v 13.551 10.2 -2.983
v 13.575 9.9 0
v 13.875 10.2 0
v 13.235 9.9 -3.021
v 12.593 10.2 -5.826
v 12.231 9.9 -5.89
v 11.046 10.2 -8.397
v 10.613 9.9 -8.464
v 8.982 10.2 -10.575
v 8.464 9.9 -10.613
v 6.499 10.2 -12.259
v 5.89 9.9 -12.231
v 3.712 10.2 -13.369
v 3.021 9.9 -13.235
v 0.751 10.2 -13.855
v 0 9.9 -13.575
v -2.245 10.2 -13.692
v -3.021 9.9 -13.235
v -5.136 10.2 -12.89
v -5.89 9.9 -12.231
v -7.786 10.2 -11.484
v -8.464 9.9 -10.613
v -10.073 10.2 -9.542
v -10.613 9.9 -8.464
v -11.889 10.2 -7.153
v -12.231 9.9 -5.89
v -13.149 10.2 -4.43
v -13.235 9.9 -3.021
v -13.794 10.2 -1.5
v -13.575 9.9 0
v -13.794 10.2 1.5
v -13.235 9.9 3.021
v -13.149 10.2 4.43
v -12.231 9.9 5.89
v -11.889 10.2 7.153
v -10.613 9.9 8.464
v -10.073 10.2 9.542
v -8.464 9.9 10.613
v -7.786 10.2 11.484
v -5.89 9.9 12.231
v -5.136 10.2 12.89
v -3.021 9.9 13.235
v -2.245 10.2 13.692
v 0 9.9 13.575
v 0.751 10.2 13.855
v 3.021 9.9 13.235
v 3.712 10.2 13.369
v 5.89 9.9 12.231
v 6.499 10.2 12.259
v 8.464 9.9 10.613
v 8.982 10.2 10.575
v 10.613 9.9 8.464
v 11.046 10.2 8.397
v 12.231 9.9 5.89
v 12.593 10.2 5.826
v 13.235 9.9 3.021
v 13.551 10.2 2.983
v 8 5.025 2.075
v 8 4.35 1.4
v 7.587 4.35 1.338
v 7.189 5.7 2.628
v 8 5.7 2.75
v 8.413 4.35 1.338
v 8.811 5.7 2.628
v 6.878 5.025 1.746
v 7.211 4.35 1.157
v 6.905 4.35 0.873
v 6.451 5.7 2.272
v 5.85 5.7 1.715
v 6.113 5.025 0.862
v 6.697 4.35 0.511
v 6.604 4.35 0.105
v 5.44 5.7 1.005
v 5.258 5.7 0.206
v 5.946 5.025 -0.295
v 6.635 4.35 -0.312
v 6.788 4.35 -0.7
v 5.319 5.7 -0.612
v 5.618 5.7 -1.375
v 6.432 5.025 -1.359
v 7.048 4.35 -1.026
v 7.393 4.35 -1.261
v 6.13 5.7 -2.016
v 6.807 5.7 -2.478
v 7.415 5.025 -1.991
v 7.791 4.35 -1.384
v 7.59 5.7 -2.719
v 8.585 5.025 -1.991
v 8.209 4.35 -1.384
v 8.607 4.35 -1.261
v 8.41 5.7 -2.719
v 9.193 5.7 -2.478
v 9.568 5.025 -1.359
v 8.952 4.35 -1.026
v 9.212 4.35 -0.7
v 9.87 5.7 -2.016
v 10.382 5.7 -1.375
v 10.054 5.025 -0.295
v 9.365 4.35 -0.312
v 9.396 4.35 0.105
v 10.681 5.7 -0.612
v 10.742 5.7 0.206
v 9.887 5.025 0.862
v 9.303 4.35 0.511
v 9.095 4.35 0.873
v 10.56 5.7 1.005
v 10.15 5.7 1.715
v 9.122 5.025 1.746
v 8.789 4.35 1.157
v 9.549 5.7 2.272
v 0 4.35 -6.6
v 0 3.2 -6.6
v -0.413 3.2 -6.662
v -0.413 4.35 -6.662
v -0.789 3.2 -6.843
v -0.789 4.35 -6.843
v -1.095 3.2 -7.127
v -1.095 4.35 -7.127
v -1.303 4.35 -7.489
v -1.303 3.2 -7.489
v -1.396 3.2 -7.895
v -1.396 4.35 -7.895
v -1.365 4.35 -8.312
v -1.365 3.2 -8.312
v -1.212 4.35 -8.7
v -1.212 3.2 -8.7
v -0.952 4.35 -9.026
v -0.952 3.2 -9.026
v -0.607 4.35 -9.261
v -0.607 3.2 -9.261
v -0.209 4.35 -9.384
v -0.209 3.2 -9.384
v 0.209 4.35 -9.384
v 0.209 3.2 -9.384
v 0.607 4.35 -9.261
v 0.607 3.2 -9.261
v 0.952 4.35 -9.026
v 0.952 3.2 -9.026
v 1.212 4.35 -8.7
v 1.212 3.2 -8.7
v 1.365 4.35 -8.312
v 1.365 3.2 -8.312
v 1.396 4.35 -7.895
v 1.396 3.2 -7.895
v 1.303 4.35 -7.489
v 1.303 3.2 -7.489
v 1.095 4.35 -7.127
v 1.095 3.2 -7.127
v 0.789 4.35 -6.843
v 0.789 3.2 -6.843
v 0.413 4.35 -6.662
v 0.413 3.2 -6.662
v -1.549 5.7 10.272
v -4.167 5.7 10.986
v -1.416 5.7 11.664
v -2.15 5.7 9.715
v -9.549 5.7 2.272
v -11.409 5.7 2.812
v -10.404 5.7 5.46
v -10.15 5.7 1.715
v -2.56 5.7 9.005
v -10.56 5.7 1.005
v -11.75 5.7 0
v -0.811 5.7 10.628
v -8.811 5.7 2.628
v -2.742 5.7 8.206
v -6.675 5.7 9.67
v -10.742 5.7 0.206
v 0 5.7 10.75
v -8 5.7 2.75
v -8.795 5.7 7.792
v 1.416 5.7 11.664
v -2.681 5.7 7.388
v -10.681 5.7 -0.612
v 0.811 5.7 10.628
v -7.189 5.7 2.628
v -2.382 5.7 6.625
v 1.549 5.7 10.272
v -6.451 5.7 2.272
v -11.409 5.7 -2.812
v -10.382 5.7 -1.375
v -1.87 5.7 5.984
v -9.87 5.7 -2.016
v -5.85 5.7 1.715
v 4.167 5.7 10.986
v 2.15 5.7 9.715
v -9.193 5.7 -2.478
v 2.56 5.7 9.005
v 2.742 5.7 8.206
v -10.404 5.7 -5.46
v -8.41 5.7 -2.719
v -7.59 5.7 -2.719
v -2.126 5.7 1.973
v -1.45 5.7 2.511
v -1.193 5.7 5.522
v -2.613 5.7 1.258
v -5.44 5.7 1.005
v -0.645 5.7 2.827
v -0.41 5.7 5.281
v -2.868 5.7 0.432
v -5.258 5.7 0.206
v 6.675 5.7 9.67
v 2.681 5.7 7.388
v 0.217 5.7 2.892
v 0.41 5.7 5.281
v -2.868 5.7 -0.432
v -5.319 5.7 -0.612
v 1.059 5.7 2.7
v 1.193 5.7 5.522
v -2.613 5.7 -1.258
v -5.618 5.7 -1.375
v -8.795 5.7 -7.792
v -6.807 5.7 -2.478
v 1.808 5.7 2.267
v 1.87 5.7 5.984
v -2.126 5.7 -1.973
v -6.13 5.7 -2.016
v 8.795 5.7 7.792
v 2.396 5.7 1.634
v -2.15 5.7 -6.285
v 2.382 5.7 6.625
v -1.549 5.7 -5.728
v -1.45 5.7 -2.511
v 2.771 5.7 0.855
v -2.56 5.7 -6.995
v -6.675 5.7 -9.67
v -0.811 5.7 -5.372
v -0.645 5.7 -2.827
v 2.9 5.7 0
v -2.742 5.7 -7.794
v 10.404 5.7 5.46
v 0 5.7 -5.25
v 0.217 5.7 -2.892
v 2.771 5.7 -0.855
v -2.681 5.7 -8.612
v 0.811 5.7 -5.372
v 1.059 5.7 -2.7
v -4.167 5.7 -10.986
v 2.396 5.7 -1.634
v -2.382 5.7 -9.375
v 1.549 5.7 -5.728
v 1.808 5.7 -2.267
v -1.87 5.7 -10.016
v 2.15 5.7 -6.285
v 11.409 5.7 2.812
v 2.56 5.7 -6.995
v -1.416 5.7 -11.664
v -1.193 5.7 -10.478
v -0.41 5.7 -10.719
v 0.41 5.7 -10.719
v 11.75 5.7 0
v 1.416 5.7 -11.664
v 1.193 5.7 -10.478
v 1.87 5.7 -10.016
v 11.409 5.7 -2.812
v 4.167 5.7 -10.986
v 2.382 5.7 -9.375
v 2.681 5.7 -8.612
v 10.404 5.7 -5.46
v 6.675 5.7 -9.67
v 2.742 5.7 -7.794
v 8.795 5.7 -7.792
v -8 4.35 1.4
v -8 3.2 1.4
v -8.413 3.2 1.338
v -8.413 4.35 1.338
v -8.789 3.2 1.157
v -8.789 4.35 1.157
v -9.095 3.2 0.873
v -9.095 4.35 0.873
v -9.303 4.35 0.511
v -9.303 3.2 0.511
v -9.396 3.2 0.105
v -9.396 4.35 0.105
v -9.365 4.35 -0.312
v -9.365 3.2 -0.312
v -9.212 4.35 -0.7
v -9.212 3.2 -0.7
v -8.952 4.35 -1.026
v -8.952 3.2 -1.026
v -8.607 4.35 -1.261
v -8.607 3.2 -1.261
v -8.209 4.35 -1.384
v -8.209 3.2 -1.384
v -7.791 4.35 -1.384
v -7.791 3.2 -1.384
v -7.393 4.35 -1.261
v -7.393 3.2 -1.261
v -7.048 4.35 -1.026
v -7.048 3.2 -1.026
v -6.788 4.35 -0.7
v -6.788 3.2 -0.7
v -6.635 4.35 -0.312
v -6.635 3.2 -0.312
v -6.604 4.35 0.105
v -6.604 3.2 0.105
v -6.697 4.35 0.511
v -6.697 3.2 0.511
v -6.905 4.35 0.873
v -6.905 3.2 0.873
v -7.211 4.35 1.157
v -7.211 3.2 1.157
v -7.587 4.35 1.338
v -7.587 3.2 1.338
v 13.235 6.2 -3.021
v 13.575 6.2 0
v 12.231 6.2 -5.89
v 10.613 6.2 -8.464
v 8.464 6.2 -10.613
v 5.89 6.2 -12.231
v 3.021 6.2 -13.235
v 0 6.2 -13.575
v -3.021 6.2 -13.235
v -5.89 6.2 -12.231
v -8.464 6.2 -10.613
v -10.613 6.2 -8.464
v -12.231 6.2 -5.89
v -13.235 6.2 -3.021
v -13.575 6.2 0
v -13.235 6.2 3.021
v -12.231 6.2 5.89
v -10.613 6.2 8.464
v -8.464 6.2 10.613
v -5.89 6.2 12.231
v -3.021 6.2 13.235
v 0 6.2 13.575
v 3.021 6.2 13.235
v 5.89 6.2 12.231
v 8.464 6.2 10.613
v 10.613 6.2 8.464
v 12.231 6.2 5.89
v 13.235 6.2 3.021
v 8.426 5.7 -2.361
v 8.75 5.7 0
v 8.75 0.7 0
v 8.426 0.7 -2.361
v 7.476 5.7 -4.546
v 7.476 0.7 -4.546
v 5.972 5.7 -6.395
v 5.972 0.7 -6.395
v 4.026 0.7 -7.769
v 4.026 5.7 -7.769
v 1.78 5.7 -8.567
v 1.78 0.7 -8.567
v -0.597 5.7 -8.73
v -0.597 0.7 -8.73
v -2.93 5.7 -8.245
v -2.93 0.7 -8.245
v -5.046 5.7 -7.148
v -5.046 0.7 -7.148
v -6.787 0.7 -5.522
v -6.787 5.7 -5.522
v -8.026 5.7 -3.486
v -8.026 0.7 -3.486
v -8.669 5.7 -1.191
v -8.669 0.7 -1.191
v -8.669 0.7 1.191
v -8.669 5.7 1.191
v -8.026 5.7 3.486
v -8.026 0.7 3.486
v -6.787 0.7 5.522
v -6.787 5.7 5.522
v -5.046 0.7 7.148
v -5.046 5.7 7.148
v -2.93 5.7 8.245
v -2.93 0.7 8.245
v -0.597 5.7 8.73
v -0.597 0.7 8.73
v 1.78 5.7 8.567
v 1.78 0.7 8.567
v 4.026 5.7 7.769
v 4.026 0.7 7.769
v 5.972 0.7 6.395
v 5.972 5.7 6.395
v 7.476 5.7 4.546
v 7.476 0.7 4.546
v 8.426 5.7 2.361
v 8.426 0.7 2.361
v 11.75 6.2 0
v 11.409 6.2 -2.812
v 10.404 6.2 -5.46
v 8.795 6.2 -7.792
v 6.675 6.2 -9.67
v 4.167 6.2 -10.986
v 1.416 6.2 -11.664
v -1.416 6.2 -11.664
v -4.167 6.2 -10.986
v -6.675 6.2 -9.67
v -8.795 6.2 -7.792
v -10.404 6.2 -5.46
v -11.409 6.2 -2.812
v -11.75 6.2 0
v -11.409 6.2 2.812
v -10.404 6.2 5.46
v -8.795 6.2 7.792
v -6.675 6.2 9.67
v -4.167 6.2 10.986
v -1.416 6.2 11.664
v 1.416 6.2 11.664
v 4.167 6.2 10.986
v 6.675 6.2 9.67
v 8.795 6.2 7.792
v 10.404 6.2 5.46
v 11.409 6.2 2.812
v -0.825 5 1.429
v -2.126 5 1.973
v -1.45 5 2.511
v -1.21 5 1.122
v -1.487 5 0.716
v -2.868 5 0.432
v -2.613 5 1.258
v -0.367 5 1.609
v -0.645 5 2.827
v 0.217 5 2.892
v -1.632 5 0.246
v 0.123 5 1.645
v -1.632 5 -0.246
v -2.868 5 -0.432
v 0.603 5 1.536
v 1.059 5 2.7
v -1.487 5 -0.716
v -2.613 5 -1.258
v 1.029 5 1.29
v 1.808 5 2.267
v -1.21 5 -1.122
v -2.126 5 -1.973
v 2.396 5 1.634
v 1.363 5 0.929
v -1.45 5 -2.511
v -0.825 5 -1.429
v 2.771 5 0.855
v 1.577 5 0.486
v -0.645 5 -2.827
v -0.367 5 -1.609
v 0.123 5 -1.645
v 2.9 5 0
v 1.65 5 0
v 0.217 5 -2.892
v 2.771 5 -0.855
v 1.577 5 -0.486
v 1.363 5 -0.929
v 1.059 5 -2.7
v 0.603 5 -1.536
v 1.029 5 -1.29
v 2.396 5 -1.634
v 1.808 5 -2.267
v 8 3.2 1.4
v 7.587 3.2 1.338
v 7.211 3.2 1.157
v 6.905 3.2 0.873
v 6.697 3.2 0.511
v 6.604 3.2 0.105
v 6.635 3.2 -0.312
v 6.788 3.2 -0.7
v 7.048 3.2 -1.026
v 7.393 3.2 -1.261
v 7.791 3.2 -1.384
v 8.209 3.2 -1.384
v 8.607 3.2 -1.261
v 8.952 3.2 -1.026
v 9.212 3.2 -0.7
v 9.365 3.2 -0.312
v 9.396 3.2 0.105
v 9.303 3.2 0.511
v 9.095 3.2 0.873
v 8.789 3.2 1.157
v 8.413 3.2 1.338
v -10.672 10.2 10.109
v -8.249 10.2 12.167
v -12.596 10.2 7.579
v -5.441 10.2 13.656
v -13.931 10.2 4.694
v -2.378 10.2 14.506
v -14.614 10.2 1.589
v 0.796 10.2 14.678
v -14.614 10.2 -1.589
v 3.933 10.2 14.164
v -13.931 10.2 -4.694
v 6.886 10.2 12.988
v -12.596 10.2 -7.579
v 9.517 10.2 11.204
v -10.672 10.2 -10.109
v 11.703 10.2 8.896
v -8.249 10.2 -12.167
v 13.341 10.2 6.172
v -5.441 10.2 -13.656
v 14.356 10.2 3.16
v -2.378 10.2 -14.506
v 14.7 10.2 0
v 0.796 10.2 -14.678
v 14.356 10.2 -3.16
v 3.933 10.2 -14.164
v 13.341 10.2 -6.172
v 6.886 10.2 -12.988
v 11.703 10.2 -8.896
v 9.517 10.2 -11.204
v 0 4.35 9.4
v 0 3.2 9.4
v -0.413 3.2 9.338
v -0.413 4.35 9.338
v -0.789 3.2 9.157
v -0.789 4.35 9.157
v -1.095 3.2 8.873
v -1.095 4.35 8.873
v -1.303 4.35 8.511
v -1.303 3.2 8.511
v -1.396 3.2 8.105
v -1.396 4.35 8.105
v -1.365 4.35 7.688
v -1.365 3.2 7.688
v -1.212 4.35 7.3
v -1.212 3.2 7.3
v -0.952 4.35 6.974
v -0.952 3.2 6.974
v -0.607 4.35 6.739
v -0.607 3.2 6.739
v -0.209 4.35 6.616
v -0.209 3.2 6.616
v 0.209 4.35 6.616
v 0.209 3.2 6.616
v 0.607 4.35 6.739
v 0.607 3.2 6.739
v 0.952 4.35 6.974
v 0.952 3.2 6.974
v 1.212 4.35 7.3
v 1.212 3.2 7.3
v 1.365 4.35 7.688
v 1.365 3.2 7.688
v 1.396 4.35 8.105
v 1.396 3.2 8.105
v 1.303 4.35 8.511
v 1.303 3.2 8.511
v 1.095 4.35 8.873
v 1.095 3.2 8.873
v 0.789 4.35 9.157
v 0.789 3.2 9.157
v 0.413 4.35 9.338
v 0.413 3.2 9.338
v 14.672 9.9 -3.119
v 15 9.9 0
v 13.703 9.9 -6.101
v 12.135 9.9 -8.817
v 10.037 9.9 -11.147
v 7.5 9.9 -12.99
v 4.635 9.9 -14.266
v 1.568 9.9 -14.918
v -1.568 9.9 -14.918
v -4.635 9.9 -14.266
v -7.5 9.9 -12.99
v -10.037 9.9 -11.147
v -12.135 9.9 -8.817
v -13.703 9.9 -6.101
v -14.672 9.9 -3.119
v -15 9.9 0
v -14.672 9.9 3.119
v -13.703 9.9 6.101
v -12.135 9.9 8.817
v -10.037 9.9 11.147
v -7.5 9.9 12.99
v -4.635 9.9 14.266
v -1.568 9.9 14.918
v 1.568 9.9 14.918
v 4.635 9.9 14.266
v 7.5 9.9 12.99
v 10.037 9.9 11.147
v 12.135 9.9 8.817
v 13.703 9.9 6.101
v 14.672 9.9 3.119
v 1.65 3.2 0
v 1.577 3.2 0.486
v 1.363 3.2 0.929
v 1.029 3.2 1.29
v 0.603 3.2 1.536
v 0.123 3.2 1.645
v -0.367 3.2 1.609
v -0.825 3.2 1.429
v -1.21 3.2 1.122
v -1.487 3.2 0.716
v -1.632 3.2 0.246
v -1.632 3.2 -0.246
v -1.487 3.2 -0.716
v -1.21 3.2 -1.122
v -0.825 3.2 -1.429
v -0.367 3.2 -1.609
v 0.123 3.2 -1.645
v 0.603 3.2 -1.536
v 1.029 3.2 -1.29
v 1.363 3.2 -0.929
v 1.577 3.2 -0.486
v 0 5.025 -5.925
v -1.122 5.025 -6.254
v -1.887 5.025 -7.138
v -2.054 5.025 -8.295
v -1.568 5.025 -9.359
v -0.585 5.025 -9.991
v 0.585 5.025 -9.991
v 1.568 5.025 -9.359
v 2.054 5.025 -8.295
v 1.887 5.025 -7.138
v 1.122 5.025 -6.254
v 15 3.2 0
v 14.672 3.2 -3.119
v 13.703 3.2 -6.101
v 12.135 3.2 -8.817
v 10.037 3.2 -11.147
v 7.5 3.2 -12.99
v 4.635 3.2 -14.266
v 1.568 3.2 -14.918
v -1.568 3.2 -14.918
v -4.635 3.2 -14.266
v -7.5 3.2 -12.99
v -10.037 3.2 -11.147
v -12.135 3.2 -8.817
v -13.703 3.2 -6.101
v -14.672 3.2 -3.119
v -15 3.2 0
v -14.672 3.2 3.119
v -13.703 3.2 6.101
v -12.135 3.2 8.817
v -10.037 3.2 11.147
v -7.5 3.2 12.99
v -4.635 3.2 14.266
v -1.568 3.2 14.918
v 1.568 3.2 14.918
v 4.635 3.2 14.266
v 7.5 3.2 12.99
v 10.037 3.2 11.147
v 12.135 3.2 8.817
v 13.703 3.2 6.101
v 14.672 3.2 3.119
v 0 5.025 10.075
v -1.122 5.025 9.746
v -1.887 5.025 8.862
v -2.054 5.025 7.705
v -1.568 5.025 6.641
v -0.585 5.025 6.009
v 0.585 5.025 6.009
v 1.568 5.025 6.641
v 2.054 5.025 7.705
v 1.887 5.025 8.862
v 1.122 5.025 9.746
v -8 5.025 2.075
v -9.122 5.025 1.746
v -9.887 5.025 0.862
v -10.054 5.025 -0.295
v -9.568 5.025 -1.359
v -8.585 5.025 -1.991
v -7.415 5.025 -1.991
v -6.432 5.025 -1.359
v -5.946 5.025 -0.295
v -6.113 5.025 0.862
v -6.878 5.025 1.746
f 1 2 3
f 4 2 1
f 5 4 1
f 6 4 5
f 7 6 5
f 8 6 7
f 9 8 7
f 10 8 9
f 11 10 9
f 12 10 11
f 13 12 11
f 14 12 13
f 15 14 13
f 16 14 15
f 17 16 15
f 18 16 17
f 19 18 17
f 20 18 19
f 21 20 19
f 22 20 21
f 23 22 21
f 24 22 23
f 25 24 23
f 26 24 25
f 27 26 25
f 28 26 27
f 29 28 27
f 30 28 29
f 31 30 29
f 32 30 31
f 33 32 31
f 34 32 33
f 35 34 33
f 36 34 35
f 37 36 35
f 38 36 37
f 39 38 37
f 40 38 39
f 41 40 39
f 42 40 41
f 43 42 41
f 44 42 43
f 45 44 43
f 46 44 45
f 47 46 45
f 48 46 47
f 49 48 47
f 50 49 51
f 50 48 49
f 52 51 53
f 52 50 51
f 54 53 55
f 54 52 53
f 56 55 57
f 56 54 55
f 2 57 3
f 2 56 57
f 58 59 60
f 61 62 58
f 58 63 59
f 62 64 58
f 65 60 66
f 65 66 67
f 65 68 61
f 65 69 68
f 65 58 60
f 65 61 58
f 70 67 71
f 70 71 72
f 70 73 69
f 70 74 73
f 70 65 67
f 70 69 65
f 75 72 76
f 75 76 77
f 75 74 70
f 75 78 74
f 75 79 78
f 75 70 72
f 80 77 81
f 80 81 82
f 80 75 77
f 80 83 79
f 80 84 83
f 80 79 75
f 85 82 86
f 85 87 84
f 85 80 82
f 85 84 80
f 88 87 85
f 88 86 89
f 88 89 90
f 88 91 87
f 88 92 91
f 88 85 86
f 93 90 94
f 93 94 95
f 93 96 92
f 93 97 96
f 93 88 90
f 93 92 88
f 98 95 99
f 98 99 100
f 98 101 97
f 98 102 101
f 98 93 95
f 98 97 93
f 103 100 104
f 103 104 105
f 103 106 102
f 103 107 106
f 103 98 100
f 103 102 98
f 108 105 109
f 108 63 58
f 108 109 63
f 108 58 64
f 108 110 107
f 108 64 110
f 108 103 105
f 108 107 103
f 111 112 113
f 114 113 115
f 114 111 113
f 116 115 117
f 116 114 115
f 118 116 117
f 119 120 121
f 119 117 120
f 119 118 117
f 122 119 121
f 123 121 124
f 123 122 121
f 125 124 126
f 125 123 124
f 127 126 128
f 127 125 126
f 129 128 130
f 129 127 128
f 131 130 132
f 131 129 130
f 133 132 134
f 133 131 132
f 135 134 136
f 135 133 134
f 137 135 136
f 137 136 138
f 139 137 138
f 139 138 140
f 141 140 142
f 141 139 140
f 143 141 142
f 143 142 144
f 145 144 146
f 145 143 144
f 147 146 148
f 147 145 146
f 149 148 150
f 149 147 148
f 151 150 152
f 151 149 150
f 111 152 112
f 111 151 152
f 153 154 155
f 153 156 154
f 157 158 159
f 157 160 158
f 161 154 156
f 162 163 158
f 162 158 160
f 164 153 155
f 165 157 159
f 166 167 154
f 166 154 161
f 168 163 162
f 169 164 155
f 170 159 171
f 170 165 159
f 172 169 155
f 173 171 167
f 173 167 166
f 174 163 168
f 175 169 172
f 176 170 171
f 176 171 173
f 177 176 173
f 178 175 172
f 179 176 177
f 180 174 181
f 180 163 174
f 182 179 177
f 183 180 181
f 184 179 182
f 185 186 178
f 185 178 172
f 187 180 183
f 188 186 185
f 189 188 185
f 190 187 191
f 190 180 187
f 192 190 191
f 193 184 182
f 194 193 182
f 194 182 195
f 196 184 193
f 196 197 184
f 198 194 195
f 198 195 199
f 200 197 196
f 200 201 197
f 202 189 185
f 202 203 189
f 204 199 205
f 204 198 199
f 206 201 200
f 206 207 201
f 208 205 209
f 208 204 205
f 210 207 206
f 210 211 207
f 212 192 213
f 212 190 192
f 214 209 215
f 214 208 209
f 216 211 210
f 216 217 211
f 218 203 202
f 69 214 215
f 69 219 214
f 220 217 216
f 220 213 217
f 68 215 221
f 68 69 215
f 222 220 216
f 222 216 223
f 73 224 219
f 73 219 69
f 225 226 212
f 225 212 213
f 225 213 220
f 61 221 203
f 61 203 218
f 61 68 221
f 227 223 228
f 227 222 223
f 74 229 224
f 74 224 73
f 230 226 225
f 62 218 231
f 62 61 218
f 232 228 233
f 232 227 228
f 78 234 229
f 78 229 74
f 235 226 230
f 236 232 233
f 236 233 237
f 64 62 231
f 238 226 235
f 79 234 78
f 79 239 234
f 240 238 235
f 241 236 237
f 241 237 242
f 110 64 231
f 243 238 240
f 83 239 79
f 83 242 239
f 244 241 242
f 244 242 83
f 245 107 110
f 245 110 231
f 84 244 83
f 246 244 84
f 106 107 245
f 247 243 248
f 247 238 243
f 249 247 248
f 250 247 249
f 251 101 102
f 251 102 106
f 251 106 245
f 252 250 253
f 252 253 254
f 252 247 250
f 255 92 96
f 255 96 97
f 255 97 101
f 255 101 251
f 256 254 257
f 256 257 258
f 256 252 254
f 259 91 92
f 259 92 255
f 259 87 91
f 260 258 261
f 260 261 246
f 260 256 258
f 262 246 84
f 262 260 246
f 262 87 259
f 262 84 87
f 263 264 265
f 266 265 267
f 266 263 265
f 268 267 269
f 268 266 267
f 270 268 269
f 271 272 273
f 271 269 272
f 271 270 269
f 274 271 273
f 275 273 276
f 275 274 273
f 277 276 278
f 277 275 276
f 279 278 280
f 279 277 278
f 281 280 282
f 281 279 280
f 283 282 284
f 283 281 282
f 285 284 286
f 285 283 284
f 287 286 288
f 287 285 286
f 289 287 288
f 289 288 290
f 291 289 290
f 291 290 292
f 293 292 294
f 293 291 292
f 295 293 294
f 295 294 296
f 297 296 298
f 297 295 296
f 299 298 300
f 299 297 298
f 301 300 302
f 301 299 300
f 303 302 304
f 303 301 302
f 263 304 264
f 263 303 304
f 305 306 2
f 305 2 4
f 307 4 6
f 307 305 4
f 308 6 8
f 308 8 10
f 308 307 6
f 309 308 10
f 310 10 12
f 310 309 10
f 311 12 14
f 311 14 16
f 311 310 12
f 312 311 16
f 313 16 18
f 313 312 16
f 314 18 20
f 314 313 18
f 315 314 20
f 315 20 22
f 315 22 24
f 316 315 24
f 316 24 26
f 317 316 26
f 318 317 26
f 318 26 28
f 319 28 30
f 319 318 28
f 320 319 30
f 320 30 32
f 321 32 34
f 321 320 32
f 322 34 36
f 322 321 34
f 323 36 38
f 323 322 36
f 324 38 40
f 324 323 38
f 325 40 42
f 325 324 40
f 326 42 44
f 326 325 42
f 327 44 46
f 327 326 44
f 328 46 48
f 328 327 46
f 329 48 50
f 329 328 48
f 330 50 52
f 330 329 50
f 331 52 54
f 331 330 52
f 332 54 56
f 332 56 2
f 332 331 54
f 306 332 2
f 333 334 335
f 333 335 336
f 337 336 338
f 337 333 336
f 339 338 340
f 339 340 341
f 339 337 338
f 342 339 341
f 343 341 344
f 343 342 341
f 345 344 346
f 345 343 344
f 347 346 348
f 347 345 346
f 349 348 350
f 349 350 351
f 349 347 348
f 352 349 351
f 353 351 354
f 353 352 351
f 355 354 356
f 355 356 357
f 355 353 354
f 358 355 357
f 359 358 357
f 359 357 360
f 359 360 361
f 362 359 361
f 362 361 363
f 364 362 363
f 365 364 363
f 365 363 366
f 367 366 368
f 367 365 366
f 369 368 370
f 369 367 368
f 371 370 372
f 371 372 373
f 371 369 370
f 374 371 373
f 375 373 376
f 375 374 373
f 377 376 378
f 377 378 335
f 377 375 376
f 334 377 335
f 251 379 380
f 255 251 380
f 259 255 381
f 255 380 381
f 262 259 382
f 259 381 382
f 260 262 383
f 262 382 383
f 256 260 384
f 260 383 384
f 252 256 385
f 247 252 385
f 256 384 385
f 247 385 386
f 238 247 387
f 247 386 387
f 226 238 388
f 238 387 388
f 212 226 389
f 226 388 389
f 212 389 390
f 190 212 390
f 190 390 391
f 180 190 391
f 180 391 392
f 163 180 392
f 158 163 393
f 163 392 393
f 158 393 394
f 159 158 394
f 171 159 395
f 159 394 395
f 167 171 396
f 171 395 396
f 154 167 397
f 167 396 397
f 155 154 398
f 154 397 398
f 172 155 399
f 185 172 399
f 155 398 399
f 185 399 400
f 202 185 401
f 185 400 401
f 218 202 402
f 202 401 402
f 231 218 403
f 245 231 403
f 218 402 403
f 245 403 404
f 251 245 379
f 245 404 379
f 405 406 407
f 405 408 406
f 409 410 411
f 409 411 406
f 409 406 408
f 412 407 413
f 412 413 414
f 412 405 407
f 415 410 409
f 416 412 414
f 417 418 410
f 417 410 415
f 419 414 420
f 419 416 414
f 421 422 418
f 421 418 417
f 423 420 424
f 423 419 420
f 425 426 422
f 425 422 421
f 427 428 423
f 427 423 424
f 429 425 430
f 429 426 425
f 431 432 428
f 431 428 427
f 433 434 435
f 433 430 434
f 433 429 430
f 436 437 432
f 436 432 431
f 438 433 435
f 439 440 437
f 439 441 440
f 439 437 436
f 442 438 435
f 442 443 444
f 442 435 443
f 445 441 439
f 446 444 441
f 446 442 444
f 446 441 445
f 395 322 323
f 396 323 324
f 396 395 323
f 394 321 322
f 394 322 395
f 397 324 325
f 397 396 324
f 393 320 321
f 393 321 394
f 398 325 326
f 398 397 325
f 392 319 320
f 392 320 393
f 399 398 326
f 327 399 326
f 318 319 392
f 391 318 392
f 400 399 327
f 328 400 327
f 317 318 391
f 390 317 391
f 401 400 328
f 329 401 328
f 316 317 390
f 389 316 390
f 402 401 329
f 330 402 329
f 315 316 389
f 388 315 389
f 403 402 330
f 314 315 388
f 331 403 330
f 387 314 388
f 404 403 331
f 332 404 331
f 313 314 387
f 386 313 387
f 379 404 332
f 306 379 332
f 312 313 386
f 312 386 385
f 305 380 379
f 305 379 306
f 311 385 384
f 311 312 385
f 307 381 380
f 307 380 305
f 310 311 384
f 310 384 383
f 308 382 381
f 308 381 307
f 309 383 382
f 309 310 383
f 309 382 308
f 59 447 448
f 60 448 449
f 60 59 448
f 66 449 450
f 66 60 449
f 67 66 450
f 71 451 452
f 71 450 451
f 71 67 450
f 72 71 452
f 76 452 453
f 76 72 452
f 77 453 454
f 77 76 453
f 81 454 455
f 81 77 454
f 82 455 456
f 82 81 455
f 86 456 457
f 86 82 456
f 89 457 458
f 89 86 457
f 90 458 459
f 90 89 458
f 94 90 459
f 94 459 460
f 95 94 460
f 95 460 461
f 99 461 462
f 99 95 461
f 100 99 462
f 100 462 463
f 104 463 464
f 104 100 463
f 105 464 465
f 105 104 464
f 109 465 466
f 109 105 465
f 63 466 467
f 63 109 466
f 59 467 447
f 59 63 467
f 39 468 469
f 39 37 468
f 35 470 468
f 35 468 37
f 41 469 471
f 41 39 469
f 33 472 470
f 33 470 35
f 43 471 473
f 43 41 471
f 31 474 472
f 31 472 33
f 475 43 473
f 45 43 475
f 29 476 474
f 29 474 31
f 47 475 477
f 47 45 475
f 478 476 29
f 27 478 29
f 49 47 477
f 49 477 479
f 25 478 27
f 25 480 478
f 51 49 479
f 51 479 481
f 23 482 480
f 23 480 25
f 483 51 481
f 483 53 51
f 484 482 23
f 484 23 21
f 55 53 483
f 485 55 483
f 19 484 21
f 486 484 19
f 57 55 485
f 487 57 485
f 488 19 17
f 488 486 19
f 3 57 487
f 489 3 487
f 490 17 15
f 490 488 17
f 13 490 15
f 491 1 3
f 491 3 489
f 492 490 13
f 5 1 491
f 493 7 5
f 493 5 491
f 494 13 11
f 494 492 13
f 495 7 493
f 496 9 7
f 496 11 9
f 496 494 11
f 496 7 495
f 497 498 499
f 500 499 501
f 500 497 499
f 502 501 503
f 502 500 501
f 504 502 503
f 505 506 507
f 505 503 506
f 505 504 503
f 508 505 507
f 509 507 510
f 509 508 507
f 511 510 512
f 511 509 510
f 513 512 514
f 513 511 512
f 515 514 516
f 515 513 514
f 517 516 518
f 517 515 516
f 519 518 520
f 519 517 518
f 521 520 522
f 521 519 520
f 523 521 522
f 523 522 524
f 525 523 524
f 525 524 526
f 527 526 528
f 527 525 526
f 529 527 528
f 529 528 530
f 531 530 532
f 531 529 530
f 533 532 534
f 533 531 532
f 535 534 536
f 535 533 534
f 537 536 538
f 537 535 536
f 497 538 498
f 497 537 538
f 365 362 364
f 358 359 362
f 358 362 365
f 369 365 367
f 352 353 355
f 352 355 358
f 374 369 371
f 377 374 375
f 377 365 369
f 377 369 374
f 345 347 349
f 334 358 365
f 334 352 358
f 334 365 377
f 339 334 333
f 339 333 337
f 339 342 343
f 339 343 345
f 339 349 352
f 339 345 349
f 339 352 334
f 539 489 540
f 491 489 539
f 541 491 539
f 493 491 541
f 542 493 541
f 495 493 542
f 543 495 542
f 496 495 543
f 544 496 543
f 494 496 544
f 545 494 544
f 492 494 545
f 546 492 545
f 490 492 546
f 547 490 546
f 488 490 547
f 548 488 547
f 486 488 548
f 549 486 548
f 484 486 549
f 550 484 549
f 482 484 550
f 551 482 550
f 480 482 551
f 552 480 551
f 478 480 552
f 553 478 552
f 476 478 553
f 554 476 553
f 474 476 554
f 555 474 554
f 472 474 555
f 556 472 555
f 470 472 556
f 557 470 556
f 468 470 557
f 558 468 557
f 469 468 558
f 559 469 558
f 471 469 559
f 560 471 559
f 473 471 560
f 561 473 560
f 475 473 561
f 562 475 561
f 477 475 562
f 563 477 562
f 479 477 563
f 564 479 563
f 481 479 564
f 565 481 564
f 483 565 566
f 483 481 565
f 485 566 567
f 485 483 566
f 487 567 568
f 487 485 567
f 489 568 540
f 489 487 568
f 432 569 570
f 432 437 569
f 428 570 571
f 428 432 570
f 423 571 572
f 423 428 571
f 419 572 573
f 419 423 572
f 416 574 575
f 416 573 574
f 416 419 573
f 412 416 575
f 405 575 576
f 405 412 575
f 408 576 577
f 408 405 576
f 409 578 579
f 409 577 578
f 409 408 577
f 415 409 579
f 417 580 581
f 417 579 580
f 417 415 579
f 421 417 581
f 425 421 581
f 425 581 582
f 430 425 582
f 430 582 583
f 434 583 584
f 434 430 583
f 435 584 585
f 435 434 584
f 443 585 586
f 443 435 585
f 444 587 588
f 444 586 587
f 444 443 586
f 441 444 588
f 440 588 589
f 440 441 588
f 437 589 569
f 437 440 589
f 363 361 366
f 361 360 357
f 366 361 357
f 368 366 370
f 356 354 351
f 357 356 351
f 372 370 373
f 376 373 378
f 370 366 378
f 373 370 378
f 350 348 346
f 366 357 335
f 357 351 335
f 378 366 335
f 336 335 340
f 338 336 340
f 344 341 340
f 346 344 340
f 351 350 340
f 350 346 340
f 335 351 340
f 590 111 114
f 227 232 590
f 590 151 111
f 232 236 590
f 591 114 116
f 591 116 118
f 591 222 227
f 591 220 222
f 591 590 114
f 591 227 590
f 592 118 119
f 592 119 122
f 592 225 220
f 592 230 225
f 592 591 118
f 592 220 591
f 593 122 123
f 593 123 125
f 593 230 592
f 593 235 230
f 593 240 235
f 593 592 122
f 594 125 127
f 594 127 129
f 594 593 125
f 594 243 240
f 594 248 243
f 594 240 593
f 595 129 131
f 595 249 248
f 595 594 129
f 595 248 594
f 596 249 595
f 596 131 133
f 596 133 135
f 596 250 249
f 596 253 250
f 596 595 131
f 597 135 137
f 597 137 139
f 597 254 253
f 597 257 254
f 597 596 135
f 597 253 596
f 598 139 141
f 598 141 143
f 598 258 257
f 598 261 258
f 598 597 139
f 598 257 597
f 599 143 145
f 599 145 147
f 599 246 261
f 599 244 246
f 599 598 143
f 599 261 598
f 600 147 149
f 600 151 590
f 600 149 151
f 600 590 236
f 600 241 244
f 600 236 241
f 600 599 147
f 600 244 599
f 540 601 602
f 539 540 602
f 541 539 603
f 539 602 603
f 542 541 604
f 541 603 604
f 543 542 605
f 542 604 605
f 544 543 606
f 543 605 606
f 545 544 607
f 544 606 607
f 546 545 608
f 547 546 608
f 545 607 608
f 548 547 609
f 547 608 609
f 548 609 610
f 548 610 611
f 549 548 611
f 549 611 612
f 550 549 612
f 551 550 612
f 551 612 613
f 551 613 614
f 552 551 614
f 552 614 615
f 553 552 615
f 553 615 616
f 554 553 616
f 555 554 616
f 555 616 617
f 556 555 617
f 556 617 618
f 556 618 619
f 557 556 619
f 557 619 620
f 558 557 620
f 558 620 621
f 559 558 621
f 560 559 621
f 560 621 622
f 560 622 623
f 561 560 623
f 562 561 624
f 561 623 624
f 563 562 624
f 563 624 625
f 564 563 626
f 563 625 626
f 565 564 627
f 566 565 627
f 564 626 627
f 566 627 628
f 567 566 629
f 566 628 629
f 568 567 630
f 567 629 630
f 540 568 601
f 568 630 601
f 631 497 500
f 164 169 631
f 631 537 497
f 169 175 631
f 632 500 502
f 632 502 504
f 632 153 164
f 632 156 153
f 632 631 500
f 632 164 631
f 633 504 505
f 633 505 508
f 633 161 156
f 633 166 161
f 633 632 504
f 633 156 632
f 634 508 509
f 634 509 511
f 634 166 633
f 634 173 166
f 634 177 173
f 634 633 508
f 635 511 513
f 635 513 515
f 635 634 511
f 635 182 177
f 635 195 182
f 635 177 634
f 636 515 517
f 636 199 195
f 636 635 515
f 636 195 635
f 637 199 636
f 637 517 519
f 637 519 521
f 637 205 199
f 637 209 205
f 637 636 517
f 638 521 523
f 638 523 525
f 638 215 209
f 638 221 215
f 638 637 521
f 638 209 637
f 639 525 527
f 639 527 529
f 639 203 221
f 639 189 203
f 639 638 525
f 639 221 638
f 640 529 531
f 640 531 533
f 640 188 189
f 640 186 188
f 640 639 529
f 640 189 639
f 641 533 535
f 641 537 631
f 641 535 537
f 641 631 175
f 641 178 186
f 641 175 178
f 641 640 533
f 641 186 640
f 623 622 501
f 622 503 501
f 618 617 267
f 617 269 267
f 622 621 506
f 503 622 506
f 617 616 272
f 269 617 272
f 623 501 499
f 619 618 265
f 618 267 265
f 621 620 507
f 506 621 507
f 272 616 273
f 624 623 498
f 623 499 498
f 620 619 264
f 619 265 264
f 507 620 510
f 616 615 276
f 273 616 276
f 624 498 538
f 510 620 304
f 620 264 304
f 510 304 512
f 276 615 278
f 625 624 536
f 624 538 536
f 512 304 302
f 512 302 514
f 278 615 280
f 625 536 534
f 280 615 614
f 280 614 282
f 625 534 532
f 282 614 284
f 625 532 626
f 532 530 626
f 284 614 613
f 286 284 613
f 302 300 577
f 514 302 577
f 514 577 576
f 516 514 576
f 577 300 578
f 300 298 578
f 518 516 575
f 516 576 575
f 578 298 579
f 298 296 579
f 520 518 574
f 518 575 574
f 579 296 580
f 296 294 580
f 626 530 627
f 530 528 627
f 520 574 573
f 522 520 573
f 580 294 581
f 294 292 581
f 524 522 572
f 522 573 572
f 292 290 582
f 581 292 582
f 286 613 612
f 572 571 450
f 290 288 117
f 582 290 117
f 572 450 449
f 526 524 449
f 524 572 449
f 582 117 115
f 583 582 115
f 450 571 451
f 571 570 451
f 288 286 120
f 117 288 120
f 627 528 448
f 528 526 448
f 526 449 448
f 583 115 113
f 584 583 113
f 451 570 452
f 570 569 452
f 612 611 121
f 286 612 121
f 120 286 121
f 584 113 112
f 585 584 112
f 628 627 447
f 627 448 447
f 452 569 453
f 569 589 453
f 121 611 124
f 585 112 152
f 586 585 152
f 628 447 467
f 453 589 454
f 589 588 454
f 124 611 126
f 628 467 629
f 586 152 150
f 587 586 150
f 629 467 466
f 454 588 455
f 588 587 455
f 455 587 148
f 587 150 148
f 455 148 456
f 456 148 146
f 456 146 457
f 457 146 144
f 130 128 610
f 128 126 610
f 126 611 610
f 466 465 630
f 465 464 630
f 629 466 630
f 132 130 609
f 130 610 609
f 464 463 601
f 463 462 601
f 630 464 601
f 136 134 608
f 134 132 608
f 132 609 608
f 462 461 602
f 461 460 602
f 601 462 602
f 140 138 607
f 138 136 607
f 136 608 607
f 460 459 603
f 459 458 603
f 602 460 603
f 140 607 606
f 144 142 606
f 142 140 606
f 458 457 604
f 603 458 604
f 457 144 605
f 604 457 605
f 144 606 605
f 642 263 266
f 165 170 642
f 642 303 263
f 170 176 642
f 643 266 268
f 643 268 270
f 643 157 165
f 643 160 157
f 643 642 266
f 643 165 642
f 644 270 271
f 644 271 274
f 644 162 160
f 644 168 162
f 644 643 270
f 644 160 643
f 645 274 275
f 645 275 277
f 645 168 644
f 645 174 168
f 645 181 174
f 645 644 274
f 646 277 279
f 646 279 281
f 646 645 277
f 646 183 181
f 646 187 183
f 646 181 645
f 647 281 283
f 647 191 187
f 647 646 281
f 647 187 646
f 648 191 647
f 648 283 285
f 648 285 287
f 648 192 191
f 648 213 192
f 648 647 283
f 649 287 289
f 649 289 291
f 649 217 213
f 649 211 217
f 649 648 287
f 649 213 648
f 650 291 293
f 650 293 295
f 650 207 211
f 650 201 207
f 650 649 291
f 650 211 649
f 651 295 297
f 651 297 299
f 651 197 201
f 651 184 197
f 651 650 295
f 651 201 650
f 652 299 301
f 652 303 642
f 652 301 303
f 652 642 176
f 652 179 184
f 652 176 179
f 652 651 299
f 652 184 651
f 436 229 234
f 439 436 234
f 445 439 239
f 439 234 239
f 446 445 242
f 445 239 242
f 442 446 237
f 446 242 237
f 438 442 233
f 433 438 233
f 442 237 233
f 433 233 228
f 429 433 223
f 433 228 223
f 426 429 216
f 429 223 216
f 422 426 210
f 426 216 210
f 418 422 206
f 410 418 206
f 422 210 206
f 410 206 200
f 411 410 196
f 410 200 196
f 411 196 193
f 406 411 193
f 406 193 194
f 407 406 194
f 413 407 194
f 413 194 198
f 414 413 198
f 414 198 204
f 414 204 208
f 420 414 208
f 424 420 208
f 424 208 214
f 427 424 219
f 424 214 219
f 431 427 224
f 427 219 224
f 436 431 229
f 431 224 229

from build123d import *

# Parameters (mm, degrees)
SKETCH1_R                                      = 15
BOSS_EXTRUDE1_DEPTH                            = 6.2
SKETCH2_R                                      = 11.75
CUT_EXTRUDE1_DEPTH                             = 0.5
SKETCH3_R                                      = 15
SKETCH3_R_2                                    = 13.575
BOSS_EXTRUDE2_DEPTH                            = 4
SKETCH4_R                                      = 1.65
CUT_EXTRUDE2_DEPTH                             = 22.96565501
SKETCH6_R                                      = 16.5
SKETCH6_R_2                                    = 1.65
BOSS_EXTRUDE3_DEPTH                            = 1
SKETCH18_R                                     = 2.9
CUT_EXTRUDE10_DEPTH                            = 0.7
CHAMFER2_SIZE                                  = 0.3
SKETCH23_R                                     = 8.75
BOSS_EXTRUDE5_DEPTH                            = 5
SKETCH27_R                                     = 16.5
CUT_EXTRUDE16_DEPTH                            = 10
SKETCH28_R                                     = 1.25
CUT_EXTRUDE17_DEPTH                            = 10
CSK_FOR_M2_5_FLAT_HEAD_MACHINE_SCREW1_AT_COUNT = 2
CSK_FOR_M2_5_FLAT_HEAD_MACHINE_SCREW1_AT_PITCH = 11.313708499
CSK_FOR_M2_5_FLAT_HEAD_MACHINE_SCREW_2_COUNT   = 2
CSK_FOR_M2_5_FLAT_HEAD_MACHINE_SCREW_2_PITCH   = 11.313708499
CSK_FOR_M2_5_FLAT_HEAD_MACHINE_SCREW_3_COUNT   = 2
CSK_FOR_M2_5_FLAT_HEAD_MACHINE_SCREW_3_PITCH   = 16


with BuildPart() as part:
    # Sketch1 → Boss-Extrude1 (new body)
    with BuildSketch(Plane(origin=(0, 0, 0), x_dir=(1, 0, 0), z_dir=(0, 1, 0))):
        Circle(SKETCH1_R)
    extrude(amount=BOSS_EXTRUDE1_DEPTH)

    # Sketch2 → Cut-Extrude1 (cut)
    with BuildSketch(Plane(origin=(0, 6.2, 0), x_dir=(1, 0, 0), z_dir=(0, 1, 0))):
        Circle(SKETCH2_R)
    extrude(amount=-CUT_EXTRUDE1_DEPTH, mode=Mode.SUBTRACT)

    # Sketch3 → Boss-Extrude2 (add)
    with BuildSketch(Plane(origin=(0, 6.2, 0), x_dir=(1, 0, 0), z_dir=(0, 1, 0))):
        Circle(SKETCH3_R)
        Circle(SKETCH3_R_2, mode=Mode.SUBTRACT)
    extrude(amount=BOSS_EXTRUDE2_DEPTH)

    # Sketch4 → Cut-Extrude2 (cut, through all)
    with BuildSketch(Plane(origin=(0, 5.7, 0), x_dir=(1, 0, 0), z_dir=(0, 1, 0))):
        Circle(SKETCH4_R)
    extrude(amount=-CUT_EXTRUDE2_DEPTH, mode=Mode.SUBTRACT)

    # Sketch6 → Boss-Extrude3 (add)
    with BuildSketch(Plane.XZ):
        Circle(SKETCH6_R)
        Circle(SKETCH6_R_2, mode=Mode.SUBTRACT)
    extrude(amount=BOSS_EXTRUDE3_DEPTH)

    # Sketch18 → Cut-Extrude10 (cut)
    with BuildSketch(Plane(origin=(0, 5.7, 0), x_dir=(1, 0, 0), z_dir=(0, 1, 0))):
        Circle(SKETCH18_R)
    extrude(amount=-CUT_EXTRUDE10_DEPTH, mode=Mode.SUBTRACT)

    # Chamfer2
    chamfer2_edges = [part.edges().sort_by_distance(p)[0] for p in [
        (-13.575, 10.2, 0),
        (-15, 10.2, 0),
    ]]
    chamfer(chamfer2_edges, length=CHAMFER2_SIZE)

    # Sketch27 → Cut-Extrude16 (cut)
    with BuildSketch(Plane(origin=(0, 3.2, 0), x_dir=(1, 0, 0), z_dir=(0, 1, 0))):
        Circle(SKETCH27_R)
    extrude(amount=-CUT_EXTRUDE16_DEPTH, mode=Mode.SUBTRACT)

    # Sketch28 → Cut-Extrude17 (cut)
    with BuildSketch(Plane(origin=(0, 5.7, 0), x_dir=(1, 0, 0), z_dir=(0, 1, 0))):
        with Locations((0, 8)):
            Circle(SKETCH28_R)
        with Locations((8, 0)):
            Circle(SKETCH28_R)
        with Locations((0, -8)):
            Circle(SKETCH28_R)
        with Locations((-8, 0)):
            Circle(SKETCH28_R)
    extrude(amount=-CUT_EXTRUDE17_DEPTH, mode=Mode.SUBTRACT)

    # Sketch30 → CSK for M2.5 Flat Head Machine Screw1 (revolve, cut)
    with BuildSketch(Plane(origin=(0, 5.7, -8), x_dir=(0, 0, 1), z_dir=(1, 0, 0))):
        Polygon((0, 0), (0, 5.841204867), (1.4, 5), (1.4, 1.35), (2.75, 0), align=None)
    csk_for_m2_5_flat_head_machine_screw1 = revolve(axis=Axis((0, 12.05, -8), (0, -1, 0)), mode=Mode.SUBTRACT)

    # CSK for M2.5 Flat Head Machine Screw1 at: CSK for M2.5 Flat Head Machine Screw1 ×2
    with Locations(*[Vector(-0.7071067811865276, 0, 0.7071067811865676) * (i * CSK_FOR_M2_5_FLAT_HEAD_MACHINE_SCREW1_AT_PITCH) for i in range(1, CSK_FOR_M2_5_FLAT_HEAD_MACHINE_SCREW1_AT_COUNT)]):
        add(csk_for_m2_5_flat_head_machine_screw1, mode=Mode.SUBTRACT)

    # CSK for M2.5 Flat Head Machine Screw 2: CSK for M2.5 Flat Head Machine Screw1 ×2
    with Locations(*[Vector(0.7071067811865676, 0, 0.7071067811865276) * (i * CSK_FOR_M2_5_FLAT_HEAD_MACHINE_SCREW_2_PITCH) for i in range(1, CSK_FOR_M2_5_FLAT_HEAD_MACHINE_SCREW_2_COUNT)]):
        add(csk_for_m2_5_flat_head_machine_screw1, mode=Mode.SUBTRACT)

    # CSK for M2.5 Flat Head Machine Screw 3: CSK for M2.5 Flat Head Machine Screw1 ×2
    with Locations(*[(0, 0, i * CSK_FOR_M2_5_FLAT_HEAD_MACHINE_SCREW_3_PITCH) for i in range(1, CSK_FOR_M2_5_FLAT_HEAD_MACHINE_SCREW_3_COUNT)]):
        add(csk_for_m2_5_flat_head_machine_screw1, mode=Mode.SUBTRACT)


with BuildPart() as body_2:
    # Sketch23 → Boss-Extrude5 (new body)
    with BuildSketch(Plane(origin=(0, 5.7, 0), x_dir=(1, 0, 0), z_dir=(0, 1, 0))):
        Circle(SKETCH23_R)
    extrude(amount=-BOSS_EXTRUDE5_DEPTH)


solid = Compound([part.part, body_2.part])
